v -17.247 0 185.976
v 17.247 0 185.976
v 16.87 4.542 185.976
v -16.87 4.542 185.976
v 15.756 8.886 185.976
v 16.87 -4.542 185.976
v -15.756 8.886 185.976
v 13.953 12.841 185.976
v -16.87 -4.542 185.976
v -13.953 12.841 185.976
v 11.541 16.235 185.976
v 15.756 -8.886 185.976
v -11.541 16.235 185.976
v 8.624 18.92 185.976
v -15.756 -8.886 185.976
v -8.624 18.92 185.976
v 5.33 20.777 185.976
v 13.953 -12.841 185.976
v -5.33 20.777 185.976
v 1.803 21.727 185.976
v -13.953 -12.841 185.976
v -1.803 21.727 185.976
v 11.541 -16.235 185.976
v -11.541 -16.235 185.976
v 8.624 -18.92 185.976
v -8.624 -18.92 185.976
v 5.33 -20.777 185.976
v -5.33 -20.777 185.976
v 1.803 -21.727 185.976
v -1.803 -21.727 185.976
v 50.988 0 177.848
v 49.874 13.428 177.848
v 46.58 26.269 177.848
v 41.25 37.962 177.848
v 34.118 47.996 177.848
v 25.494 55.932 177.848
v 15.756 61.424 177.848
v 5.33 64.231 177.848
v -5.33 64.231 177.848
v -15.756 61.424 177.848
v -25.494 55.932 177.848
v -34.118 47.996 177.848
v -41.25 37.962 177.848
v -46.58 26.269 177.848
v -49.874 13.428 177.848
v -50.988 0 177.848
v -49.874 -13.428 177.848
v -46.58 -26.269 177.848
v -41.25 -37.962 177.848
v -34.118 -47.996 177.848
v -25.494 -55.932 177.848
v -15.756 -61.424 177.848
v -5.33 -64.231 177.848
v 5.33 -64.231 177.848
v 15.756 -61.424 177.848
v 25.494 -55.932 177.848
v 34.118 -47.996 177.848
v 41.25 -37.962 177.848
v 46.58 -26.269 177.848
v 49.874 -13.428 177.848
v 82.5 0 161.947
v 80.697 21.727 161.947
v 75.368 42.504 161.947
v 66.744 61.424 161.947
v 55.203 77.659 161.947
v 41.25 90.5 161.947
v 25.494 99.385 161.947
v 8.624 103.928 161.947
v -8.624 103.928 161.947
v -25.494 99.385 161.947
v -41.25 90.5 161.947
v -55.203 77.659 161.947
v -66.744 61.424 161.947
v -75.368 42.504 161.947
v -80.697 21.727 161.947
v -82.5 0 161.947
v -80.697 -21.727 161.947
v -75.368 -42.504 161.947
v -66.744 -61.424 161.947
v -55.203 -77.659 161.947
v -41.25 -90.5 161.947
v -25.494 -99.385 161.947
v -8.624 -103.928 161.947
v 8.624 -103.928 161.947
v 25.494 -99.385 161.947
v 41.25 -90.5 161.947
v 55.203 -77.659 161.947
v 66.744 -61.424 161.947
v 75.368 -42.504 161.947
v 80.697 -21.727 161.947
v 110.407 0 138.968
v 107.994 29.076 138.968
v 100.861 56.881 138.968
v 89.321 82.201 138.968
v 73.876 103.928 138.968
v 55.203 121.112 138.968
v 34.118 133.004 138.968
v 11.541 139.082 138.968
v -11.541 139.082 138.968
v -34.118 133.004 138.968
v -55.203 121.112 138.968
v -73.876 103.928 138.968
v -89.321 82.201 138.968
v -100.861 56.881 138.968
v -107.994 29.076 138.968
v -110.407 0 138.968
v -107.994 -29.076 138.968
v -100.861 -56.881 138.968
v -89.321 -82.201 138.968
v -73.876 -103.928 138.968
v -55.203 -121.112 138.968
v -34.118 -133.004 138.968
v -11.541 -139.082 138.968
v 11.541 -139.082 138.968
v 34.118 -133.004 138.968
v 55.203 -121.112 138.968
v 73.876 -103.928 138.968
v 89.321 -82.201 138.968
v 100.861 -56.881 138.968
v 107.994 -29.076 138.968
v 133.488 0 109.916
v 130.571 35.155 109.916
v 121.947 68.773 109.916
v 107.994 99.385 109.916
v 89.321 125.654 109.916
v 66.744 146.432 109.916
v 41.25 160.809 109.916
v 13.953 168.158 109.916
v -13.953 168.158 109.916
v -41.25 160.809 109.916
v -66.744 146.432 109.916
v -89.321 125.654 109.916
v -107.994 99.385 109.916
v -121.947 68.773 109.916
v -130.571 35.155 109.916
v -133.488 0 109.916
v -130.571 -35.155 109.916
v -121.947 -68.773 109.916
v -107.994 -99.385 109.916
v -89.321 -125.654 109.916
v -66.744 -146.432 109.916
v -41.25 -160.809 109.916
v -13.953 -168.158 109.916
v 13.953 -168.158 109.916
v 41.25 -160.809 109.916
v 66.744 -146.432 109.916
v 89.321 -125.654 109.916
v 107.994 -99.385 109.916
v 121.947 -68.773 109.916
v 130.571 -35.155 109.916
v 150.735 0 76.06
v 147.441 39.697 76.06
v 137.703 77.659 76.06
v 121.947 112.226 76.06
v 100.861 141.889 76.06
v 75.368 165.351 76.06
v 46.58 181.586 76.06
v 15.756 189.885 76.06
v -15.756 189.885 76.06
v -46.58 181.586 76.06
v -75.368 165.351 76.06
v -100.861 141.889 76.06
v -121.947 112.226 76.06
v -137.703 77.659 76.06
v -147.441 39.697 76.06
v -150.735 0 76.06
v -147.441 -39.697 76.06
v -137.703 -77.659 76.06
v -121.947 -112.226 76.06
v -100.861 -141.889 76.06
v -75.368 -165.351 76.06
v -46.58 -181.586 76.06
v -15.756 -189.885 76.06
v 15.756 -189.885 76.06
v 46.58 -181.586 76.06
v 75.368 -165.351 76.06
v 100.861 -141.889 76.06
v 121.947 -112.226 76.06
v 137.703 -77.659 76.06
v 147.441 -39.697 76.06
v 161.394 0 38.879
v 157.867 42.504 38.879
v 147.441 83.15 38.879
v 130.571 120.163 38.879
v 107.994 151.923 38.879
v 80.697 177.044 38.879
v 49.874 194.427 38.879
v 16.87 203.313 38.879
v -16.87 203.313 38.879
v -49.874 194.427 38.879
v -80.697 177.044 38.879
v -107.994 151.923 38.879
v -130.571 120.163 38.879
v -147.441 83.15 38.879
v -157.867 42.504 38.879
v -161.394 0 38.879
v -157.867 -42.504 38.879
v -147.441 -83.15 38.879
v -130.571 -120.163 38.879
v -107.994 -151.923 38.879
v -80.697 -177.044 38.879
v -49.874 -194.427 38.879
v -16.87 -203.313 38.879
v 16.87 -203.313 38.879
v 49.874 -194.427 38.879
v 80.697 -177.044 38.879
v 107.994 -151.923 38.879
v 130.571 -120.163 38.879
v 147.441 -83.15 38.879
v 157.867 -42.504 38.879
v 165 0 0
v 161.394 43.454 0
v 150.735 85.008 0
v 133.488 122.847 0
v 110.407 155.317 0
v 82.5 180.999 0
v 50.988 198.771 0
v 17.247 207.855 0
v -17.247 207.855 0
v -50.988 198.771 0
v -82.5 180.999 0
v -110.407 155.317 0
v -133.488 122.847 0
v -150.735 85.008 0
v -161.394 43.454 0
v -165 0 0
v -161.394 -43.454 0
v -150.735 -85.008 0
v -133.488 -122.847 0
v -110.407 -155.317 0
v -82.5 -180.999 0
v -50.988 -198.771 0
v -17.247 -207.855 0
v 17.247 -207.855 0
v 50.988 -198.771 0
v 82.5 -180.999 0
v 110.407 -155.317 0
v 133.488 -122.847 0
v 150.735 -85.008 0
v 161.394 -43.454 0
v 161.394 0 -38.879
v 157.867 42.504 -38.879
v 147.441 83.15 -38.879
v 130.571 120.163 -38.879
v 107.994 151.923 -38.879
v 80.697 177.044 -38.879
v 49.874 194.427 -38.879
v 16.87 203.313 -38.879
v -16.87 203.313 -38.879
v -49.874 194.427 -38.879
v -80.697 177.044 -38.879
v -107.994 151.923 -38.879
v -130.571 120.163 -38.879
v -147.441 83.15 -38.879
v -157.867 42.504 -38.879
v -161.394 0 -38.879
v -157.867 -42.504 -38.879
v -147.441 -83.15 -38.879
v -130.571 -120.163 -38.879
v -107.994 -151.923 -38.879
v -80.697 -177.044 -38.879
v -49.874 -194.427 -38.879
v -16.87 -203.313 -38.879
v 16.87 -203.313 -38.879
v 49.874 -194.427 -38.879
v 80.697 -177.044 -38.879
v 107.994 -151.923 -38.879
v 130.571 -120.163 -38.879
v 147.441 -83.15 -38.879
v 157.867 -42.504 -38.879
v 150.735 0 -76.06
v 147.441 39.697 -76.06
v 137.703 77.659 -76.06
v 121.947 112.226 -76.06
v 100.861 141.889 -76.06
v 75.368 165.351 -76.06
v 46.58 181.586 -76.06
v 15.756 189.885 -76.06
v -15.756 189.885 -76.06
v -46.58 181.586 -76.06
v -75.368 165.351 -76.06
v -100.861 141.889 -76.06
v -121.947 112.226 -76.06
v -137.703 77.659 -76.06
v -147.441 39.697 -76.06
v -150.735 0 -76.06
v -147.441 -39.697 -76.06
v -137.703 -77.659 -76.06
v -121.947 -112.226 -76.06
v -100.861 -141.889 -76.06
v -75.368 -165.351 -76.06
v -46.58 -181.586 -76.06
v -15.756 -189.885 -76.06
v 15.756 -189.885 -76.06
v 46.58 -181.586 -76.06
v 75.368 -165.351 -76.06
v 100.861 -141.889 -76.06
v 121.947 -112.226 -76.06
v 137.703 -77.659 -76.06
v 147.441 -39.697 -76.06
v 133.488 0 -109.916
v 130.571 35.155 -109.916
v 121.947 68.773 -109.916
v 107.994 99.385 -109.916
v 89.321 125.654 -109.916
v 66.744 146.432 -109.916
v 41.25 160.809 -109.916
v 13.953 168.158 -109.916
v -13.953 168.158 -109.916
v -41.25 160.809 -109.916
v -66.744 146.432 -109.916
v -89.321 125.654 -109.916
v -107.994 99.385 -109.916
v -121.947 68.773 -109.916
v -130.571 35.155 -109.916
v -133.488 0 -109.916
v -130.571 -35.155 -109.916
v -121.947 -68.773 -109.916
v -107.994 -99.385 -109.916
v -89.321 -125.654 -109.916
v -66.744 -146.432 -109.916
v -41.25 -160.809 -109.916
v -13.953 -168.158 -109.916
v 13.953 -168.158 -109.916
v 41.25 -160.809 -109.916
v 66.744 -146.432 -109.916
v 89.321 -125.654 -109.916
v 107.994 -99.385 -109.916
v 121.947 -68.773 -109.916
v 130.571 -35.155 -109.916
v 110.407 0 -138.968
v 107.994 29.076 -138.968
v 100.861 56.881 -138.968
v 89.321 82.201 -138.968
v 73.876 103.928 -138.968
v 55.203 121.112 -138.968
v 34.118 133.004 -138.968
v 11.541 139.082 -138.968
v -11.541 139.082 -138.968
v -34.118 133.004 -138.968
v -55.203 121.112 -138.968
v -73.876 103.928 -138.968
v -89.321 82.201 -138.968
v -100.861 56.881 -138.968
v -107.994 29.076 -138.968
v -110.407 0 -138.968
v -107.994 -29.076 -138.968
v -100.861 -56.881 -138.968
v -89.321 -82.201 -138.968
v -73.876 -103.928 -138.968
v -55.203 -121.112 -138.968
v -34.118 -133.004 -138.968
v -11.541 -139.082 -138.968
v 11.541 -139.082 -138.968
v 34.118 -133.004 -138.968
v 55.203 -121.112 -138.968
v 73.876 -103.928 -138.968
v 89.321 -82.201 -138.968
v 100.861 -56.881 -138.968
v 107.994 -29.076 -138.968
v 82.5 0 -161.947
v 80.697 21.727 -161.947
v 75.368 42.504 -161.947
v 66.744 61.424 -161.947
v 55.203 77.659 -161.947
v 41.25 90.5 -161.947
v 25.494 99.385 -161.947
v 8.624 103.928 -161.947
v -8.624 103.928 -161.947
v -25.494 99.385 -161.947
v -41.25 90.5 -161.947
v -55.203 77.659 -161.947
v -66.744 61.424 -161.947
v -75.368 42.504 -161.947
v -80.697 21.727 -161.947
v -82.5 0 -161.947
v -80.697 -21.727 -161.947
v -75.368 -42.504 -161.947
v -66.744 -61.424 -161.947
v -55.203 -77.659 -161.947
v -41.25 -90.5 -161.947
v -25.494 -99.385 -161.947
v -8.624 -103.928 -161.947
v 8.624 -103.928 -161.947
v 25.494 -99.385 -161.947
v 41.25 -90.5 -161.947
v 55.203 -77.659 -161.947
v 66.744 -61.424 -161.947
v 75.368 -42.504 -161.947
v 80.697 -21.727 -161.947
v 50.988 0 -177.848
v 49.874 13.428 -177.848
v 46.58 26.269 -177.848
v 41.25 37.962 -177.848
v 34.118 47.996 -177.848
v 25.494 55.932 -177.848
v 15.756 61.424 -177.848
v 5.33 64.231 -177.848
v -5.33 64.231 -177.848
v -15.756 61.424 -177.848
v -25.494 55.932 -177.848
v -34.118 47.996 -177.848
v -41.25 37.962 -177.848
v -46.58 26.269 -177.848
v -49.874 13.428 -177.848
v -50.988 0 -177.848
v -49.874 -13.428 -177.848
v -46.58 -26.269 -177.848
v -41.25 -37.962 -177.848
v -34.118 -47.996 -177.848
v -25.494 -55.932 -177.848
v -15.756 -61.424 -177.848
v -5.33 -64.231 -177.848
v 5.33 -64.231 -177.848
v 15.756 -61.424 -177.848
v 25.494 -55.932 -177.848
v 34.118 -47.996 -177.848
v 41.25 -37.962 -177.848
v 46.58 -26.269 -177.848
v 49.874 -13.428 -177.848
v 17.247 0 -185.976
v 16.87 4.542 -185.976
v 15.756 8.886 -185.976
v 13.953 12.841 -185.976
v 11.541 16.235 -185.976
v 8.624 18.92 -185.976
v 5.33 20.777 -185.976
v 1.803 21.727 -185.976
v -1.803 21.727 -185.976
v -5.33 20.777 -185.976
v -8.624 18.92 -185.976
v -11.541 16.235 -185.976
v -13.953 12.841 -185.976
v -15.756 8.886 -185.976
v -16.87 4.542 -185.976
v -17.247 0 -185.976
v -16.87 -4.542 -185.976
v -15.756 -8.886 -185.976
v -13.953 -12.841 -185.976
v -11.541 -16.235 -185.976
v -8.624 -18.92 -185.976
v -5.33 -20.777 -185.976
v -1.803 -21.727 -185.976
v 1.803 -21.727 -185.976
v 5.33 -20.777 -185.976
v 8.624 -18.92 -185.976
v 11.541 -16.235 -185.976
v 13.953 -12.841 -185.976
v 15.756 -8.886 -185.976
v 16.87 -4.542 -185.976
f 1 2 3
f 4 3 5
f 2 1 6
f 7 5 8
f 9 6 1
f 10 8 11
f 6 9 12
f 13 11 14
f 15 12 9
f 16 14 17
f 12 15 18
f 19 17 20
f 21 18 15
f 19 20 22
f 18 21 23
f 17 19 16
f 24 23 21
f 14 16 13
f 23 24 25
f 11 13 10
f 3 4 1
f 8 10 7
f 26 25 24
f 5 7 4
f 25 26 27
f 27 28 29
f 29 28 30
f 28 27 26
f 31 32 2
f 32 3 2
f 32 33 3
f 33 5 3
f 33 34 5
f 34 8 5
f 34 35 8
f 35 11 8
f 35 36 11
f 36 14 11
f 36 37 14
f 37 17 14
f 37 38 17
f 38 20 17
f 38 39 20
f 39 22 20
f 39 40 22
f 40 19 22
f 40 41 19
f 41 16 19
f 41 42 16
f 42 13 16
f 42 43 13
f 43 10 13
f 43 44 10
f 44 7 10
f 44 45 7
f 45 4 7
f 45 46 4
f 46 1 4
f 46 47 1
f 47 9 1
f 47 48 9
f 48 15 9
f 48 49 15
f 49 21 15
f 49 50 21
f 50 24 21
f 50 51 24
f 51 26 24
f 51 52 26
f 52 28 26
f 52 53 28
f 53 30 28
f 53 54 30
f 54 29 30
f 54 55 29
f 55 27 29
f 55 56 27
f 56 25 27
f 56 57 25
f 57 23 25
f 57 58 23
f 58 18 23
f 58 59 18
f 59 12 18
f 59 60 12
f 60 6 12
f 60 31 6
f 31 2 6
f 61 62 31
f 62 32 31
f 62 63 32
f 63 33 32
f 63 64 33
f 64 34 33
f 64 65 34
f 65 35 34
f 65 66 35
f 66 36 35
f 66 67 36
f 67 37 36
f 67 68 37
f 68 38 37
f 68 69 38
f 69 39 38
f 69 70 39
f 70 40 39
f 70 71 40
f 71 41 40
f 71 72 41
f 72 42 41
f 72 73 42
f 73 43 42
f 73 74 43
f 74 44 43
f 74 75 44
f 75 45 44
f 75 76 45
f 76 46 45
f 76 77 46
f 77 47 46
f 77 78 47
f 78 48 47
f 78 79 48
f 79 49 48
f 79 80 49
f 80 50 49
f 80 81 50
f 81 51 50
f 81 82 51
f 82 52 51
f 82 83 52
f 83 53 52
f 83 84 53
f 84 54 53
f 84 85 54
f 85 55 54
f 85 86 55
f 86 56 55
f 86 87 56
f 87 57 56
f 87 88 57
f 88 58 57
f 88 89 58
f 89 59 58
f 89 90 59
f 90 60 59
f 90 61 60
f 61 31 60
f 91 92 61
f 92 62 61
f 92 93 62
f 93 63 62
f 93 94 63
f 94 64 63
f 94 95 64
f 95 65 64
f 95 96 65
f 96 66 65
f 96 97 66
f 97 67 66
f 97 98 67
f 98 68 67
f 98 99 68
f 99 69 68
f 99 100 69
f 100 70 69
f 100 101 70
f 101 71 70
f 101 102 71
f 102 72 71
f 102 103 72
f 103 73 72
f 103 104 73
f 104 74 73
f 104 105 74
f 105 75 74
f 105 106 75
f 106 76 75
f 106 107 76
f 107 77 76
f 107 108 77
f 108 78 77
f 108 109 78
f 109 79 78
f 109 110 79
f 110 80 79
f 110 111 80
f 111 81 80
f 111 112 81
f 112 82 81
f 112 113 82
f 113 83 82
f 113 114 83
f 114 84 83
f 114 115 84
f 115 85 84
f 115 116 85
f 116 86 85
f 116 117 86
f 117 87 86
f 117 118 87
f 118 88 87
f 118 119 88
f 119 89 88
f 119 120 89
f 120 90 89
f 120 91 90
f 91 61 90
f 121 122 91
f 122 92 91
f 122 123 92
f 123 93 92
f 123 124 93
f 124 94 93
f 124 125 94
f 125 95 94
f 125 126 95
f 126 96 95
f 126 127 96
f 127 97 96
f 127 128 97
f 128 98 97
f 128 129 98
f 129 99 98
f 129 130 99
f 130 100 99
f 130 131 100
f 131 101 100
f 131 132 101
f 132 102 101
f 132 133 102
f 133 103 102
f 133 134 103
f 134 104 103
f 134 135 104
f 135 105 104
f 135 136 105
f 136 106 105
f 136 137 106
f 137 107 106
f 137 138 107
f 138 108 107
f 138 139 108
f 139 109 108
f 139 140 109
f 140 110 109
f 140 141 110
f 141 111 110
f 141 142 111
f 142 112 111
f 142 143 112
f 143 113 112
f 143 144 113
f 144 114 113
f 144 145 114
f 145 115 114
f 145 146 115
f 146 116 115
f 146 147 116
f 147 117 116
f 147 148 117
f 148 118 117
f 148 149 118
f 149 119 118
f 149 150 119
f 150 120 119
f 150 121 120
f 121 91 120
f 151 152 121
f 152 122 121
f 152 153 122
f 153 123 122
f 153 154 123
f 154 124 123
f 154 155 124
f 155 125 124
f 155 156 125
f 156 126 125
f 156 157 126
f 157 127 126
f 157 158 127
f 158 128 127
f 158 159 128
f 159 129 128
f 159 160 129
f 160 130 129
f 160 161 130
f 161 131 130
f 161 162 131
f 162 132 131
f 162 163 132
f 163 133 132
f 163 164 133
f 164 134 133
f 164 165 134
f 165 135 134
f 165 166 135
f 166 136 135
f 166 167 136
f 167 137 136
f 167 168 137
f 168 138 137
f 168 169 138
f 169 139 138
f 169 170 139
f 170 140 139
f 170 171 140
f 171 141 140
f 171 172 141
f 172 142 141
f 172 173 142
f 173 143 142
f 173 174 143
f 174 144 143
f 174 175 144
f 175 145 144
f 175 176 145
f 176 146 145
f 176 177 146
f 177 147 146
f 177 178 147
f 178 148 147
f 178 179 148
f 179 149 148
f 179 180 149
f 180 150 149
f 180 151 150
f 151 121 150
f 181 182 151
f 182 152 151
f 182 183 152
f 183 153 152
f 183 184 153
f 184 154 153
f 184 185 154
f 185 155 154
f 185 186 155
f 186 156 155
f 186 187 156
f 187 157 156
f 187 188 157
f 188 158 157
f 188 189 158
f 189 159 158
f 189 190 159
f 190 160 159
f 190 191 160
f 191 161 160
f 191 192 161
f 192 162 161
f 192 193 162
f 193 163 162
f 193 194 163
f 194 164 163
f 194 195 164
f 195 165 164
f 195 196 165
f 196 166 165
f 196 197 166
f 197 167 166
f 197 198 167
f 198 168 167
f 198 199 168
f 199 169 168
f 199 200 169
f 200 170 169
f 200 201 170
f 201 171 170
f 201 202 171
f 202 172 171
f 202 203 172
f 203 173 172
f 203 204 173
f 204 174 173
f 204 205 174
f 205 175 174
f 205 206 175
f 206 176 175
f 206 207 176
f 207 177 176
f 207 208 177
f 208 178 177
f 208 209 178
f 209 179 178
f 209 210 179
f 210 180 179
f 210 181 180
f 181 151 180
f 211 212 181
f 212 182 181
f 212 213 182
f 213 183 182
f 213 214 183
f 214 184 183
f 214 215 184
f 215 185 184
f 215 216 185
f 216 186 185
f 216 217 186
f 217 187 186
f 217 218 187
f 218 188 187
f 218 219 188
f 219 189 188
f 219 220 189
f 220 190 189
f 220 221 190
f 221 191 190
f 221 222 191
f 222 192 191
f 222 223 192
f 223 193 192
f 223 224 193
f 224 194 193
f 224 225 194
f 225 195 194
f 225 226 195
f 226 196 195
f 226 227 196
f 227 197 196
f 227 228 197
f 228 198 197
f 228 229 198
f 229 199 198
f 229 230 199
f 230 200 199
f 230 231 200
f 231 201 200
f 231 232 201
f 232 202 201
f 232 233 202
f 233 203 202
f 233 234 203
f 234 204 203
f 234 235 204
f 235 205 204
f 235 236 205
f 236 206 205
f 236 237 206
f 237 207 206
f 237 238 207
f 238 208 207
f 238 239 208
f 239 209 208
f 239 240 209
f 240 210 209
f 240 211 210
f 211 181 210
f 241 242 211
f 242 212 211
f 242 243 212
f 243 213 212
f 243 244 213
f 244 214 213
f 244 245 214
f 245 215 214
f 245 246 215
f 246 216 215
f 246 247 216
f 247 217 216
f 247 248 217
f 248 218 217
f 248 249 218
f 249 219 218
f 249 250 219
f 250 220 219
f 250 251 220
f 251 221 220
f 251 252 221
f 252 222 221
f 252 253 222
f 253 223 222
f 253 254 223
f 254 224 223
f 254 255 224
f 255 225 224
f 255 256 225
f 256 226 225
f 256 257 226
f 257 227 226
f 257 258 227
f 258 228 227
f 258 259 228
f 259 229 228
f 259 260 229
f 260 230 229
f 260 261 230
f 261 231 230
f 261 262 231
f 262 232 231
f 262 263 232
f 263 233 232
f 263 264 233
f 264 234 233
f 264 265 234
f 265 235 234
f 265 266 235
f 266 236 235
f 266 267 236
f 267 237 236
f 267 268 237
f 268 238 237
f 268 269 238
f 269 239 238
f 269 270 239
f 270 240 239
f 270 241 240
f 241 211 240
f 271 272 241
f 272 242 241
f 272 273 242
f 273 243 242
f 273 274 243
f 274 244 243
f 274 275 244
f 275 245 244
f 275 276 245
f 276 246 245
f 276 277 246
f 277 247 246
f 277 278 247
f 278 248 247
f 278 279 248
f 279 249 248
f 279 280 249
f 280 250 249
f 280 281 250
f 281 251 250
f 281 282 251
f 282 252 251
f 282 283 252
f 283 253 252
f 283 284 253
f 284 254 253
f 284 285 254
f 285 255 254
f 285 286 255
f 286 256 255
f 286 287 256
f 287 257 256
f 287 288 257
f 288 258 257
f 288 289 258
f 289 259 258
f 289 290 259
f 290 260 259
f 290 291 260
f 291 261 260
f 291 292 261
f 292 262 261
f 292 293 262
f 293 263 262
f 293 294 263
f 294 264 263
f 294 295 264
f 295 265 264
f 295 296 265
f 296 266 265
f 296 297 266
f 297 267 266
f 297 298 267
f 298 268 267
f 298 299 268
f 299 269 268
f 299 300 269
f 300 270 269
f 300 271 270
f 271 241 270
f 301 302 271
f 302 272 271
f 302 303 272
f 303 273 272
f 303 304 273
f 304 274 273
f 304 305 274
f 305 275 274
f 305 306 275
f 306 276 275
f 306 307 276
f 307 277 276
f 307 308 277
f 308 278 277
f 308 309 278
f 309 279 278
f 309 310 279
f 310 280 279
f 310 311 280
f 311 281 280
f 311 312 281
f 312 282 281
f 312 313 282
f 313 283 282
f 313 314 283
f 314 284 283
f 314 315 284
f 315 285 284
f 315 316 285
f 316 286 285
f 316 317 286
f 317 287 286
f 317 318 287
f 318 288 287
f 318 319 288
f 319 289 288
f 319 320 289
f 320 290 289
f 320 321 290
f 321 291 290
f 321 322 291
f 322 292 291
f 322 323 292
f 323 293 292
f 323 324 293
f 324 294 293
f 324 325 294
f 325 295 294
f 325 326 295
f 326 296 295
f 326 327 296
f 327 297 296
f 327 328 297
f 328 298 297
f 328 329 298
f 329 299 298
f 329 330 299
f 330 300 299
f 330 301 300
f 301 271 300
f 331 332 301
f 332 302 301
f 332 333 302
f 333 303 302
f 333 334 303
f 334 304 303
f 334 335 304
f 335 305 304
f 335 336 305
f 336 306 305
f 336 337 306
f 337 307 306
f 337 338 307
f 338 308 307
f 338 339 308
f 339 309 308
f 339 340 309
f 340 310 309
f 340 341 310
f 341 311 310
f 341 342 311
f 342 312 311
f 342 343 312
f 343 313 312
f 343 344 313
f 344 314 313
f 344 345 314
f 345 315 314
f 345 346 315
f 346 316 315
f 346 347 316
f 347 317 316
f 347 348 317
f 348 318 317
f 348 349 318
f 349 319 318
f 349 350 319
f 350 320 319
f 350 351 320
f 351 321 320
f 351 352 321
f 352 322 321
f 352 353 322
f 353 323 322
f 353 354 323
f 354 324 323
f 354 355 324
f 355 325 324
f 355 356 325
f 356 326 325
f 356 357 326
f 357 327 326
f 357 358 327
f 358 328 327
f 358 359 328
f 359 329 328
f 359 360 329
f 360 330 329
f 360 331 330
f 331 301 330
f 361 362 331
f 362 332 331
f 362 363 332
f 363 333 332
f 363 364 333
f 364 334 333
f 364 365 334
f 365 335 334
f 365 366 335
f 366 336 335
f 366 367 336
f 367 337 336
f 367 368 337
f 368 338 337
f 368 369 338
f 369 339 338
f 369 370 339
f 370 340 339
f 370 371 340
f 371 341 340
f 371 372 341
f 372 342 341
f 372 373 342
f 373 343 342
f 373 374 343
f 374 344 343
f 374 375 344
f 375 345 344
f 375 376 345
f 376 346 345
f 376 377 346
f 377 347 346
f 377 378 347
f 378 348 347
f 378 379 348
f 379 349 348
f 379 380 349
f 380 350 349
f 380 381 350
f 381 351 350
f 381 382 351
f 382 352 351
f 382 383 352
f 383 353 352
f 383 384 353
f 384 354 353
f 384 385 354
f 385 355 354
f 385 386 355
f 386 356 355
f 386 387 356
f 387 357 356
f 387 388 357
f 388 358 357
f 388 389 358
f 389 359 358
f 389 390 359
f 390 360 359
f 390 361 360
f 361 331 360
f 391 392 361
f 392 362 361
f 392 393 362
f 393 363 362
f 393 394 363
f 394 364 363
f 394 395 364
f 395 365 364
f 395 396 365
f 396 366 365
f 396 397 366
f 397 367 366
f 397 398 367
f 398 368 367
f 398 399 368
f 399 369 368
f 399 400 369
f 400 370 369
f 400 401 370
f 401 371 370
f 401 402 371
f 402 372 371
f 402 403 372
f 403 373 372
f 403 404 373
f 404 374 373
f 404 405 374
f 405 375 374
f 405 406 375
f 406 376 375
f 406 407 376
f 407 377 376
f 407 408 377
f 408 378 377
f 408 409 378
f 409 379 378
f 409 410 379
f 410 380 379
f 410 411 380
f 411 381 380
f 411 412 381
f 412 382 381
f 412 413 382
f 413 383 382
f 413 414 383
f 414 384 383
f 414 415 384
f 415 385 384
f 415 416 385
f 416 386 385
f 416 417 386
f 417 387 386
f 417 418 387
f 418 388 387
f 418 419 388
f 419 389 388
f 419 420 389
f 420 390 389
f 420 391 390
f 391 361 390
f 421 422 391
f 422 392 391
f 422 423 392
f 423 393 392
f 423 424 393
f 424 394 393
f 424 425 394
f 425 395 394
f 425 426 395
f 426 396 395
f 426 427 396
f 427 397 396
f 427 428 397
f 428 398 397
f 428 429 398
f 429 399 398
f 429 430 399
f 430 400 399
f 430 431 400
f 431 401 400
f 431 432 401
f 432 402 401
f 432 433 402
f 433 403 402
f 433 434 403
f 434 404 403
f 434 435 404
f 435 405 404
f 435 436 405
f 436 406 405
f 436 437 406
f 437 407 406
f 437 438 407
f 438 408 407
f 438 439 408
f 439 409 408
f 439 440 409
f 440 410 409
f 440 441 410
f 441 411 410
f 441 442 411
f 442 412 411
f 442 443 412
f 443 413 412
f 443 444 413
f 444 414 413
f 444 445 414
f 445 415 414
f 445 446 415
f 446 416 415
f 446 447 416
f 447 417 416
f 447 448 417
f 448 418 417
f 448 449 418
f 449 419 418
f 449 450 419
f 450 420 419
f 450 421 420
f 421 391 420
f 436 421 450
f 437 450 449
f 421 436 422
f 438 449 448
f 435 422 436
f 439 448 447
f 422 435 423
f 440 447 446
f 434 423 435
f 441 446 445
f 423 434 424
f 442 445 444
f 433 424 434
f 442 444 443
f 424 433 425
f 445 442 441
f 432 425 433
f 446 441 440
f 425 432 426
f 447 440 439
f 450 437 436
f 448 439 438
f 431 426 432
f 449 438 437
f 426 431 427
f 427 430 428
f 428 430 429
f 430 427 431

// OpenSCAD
// Generated by SolidPython 1.0.1 on 2020-07-29 00:46:52


scale(v = [15, 19, 17]) {
	sphere(r = 11);
}
/***********************************************
*********      SolidPython code:      **********
************************************************
 
# import packages: SolidPython
from solid import *
from solid.utils import *
from itertools import chain, combinations, permutations


class Resize:

    def __init__(self, scad_file):
        self.scad_file = scad_file
        #self.scad_file = import_scad(scad_file)
        # cone/cylinder param:
        self.r1 = 0
        self.r2 = 0
        self.h = 0
        # rectangular prism param:
        self.w = 0
        self.l = 0
        # ellipse param:
        self.r = 0

    # import OpenScad code (file name corresponds to shape)


    # classify shape + parameters
    def assign(self, param1, param2, param3):
        if self.scad_file == 'cone.scad':
            self.r1 = param1
            self.r2 = param2
            self.h = param3
        elif self.scad_file == 'cylinder.scad':
            self.r1 = param1
            self.r2 = param2
            self.h = param3
        elif self.scad_file == 'rectangularPrism.scad':
            self.h = param1
            self.l = param2
            self.w = param3
        else:
            self.r = param1
            self.h = param2

    # resize parameters
    def iterate(self):
        x = range(3, 20, 2)
        i = 1
        if self.scad_file == 'cone.scad':
            tempList = list(permutations(x, 2))
            for temp in tempList:
                param1 = temp[0]
                param2 = temp[1]
                filepath = 'produced_scad_files/' + 'cone' + str(param1) + '_' + str(param2) + '_' + '.scad'
                scad_render_to_file(cylinder(h=param1, r1=param2, r2=0), filepath)

        elif self.scad_file == 'cylinder.scad':
            tempList = list(permutations(x, 3))
            for temp in tempList:
                param1 = temp[0]
                param2 = temp[1]
                filepath = 'produced_scad_files/' + 'cylinder' + str(param1) + '_' + str(param2) + '_' + '.scad'
                scad_render_to_file(cylinder(h=param1, r1=param2, r2=param2), filepath)

        elif self.scad_file == 'rectangularPrism.scad':
            tempList = list(permutations(x, 3))
            for temp in tempList:
                param1 = temp[0]
                param2 = temp[1]
                param3 = temp[2]
                filepath = 'produced_scad_files/' + 'rectangularPrism' + str(param1) + '_' + str(param2) + '_' + str(
                    param3) + '.scad'
                scad_render_to_file(cube(size=(param1, param2, param3)), filepath)

        elif self.scad_file == 'ellipse.scad':
            tempList = list(permutations(x, 4))
            for temp in tempList:
                param1 = temp[0]
                param2 = temp[1]
                param3 = temp[2]
                param4 = temp[3]
                filepath = 'produced_scad_files/' + 'ellipse' + str(param1) + '_' + str(param2) + '_' + str(param3) + '_' + str(param4) + '.scad'
                scad_render_to_file(scale([param1, param2, param3])(sphere(r=param4)), filepath)

    def render_to_scadfile(self):
        scad_render_to_file(scad, 'example.scad') 
 
************************************************/
